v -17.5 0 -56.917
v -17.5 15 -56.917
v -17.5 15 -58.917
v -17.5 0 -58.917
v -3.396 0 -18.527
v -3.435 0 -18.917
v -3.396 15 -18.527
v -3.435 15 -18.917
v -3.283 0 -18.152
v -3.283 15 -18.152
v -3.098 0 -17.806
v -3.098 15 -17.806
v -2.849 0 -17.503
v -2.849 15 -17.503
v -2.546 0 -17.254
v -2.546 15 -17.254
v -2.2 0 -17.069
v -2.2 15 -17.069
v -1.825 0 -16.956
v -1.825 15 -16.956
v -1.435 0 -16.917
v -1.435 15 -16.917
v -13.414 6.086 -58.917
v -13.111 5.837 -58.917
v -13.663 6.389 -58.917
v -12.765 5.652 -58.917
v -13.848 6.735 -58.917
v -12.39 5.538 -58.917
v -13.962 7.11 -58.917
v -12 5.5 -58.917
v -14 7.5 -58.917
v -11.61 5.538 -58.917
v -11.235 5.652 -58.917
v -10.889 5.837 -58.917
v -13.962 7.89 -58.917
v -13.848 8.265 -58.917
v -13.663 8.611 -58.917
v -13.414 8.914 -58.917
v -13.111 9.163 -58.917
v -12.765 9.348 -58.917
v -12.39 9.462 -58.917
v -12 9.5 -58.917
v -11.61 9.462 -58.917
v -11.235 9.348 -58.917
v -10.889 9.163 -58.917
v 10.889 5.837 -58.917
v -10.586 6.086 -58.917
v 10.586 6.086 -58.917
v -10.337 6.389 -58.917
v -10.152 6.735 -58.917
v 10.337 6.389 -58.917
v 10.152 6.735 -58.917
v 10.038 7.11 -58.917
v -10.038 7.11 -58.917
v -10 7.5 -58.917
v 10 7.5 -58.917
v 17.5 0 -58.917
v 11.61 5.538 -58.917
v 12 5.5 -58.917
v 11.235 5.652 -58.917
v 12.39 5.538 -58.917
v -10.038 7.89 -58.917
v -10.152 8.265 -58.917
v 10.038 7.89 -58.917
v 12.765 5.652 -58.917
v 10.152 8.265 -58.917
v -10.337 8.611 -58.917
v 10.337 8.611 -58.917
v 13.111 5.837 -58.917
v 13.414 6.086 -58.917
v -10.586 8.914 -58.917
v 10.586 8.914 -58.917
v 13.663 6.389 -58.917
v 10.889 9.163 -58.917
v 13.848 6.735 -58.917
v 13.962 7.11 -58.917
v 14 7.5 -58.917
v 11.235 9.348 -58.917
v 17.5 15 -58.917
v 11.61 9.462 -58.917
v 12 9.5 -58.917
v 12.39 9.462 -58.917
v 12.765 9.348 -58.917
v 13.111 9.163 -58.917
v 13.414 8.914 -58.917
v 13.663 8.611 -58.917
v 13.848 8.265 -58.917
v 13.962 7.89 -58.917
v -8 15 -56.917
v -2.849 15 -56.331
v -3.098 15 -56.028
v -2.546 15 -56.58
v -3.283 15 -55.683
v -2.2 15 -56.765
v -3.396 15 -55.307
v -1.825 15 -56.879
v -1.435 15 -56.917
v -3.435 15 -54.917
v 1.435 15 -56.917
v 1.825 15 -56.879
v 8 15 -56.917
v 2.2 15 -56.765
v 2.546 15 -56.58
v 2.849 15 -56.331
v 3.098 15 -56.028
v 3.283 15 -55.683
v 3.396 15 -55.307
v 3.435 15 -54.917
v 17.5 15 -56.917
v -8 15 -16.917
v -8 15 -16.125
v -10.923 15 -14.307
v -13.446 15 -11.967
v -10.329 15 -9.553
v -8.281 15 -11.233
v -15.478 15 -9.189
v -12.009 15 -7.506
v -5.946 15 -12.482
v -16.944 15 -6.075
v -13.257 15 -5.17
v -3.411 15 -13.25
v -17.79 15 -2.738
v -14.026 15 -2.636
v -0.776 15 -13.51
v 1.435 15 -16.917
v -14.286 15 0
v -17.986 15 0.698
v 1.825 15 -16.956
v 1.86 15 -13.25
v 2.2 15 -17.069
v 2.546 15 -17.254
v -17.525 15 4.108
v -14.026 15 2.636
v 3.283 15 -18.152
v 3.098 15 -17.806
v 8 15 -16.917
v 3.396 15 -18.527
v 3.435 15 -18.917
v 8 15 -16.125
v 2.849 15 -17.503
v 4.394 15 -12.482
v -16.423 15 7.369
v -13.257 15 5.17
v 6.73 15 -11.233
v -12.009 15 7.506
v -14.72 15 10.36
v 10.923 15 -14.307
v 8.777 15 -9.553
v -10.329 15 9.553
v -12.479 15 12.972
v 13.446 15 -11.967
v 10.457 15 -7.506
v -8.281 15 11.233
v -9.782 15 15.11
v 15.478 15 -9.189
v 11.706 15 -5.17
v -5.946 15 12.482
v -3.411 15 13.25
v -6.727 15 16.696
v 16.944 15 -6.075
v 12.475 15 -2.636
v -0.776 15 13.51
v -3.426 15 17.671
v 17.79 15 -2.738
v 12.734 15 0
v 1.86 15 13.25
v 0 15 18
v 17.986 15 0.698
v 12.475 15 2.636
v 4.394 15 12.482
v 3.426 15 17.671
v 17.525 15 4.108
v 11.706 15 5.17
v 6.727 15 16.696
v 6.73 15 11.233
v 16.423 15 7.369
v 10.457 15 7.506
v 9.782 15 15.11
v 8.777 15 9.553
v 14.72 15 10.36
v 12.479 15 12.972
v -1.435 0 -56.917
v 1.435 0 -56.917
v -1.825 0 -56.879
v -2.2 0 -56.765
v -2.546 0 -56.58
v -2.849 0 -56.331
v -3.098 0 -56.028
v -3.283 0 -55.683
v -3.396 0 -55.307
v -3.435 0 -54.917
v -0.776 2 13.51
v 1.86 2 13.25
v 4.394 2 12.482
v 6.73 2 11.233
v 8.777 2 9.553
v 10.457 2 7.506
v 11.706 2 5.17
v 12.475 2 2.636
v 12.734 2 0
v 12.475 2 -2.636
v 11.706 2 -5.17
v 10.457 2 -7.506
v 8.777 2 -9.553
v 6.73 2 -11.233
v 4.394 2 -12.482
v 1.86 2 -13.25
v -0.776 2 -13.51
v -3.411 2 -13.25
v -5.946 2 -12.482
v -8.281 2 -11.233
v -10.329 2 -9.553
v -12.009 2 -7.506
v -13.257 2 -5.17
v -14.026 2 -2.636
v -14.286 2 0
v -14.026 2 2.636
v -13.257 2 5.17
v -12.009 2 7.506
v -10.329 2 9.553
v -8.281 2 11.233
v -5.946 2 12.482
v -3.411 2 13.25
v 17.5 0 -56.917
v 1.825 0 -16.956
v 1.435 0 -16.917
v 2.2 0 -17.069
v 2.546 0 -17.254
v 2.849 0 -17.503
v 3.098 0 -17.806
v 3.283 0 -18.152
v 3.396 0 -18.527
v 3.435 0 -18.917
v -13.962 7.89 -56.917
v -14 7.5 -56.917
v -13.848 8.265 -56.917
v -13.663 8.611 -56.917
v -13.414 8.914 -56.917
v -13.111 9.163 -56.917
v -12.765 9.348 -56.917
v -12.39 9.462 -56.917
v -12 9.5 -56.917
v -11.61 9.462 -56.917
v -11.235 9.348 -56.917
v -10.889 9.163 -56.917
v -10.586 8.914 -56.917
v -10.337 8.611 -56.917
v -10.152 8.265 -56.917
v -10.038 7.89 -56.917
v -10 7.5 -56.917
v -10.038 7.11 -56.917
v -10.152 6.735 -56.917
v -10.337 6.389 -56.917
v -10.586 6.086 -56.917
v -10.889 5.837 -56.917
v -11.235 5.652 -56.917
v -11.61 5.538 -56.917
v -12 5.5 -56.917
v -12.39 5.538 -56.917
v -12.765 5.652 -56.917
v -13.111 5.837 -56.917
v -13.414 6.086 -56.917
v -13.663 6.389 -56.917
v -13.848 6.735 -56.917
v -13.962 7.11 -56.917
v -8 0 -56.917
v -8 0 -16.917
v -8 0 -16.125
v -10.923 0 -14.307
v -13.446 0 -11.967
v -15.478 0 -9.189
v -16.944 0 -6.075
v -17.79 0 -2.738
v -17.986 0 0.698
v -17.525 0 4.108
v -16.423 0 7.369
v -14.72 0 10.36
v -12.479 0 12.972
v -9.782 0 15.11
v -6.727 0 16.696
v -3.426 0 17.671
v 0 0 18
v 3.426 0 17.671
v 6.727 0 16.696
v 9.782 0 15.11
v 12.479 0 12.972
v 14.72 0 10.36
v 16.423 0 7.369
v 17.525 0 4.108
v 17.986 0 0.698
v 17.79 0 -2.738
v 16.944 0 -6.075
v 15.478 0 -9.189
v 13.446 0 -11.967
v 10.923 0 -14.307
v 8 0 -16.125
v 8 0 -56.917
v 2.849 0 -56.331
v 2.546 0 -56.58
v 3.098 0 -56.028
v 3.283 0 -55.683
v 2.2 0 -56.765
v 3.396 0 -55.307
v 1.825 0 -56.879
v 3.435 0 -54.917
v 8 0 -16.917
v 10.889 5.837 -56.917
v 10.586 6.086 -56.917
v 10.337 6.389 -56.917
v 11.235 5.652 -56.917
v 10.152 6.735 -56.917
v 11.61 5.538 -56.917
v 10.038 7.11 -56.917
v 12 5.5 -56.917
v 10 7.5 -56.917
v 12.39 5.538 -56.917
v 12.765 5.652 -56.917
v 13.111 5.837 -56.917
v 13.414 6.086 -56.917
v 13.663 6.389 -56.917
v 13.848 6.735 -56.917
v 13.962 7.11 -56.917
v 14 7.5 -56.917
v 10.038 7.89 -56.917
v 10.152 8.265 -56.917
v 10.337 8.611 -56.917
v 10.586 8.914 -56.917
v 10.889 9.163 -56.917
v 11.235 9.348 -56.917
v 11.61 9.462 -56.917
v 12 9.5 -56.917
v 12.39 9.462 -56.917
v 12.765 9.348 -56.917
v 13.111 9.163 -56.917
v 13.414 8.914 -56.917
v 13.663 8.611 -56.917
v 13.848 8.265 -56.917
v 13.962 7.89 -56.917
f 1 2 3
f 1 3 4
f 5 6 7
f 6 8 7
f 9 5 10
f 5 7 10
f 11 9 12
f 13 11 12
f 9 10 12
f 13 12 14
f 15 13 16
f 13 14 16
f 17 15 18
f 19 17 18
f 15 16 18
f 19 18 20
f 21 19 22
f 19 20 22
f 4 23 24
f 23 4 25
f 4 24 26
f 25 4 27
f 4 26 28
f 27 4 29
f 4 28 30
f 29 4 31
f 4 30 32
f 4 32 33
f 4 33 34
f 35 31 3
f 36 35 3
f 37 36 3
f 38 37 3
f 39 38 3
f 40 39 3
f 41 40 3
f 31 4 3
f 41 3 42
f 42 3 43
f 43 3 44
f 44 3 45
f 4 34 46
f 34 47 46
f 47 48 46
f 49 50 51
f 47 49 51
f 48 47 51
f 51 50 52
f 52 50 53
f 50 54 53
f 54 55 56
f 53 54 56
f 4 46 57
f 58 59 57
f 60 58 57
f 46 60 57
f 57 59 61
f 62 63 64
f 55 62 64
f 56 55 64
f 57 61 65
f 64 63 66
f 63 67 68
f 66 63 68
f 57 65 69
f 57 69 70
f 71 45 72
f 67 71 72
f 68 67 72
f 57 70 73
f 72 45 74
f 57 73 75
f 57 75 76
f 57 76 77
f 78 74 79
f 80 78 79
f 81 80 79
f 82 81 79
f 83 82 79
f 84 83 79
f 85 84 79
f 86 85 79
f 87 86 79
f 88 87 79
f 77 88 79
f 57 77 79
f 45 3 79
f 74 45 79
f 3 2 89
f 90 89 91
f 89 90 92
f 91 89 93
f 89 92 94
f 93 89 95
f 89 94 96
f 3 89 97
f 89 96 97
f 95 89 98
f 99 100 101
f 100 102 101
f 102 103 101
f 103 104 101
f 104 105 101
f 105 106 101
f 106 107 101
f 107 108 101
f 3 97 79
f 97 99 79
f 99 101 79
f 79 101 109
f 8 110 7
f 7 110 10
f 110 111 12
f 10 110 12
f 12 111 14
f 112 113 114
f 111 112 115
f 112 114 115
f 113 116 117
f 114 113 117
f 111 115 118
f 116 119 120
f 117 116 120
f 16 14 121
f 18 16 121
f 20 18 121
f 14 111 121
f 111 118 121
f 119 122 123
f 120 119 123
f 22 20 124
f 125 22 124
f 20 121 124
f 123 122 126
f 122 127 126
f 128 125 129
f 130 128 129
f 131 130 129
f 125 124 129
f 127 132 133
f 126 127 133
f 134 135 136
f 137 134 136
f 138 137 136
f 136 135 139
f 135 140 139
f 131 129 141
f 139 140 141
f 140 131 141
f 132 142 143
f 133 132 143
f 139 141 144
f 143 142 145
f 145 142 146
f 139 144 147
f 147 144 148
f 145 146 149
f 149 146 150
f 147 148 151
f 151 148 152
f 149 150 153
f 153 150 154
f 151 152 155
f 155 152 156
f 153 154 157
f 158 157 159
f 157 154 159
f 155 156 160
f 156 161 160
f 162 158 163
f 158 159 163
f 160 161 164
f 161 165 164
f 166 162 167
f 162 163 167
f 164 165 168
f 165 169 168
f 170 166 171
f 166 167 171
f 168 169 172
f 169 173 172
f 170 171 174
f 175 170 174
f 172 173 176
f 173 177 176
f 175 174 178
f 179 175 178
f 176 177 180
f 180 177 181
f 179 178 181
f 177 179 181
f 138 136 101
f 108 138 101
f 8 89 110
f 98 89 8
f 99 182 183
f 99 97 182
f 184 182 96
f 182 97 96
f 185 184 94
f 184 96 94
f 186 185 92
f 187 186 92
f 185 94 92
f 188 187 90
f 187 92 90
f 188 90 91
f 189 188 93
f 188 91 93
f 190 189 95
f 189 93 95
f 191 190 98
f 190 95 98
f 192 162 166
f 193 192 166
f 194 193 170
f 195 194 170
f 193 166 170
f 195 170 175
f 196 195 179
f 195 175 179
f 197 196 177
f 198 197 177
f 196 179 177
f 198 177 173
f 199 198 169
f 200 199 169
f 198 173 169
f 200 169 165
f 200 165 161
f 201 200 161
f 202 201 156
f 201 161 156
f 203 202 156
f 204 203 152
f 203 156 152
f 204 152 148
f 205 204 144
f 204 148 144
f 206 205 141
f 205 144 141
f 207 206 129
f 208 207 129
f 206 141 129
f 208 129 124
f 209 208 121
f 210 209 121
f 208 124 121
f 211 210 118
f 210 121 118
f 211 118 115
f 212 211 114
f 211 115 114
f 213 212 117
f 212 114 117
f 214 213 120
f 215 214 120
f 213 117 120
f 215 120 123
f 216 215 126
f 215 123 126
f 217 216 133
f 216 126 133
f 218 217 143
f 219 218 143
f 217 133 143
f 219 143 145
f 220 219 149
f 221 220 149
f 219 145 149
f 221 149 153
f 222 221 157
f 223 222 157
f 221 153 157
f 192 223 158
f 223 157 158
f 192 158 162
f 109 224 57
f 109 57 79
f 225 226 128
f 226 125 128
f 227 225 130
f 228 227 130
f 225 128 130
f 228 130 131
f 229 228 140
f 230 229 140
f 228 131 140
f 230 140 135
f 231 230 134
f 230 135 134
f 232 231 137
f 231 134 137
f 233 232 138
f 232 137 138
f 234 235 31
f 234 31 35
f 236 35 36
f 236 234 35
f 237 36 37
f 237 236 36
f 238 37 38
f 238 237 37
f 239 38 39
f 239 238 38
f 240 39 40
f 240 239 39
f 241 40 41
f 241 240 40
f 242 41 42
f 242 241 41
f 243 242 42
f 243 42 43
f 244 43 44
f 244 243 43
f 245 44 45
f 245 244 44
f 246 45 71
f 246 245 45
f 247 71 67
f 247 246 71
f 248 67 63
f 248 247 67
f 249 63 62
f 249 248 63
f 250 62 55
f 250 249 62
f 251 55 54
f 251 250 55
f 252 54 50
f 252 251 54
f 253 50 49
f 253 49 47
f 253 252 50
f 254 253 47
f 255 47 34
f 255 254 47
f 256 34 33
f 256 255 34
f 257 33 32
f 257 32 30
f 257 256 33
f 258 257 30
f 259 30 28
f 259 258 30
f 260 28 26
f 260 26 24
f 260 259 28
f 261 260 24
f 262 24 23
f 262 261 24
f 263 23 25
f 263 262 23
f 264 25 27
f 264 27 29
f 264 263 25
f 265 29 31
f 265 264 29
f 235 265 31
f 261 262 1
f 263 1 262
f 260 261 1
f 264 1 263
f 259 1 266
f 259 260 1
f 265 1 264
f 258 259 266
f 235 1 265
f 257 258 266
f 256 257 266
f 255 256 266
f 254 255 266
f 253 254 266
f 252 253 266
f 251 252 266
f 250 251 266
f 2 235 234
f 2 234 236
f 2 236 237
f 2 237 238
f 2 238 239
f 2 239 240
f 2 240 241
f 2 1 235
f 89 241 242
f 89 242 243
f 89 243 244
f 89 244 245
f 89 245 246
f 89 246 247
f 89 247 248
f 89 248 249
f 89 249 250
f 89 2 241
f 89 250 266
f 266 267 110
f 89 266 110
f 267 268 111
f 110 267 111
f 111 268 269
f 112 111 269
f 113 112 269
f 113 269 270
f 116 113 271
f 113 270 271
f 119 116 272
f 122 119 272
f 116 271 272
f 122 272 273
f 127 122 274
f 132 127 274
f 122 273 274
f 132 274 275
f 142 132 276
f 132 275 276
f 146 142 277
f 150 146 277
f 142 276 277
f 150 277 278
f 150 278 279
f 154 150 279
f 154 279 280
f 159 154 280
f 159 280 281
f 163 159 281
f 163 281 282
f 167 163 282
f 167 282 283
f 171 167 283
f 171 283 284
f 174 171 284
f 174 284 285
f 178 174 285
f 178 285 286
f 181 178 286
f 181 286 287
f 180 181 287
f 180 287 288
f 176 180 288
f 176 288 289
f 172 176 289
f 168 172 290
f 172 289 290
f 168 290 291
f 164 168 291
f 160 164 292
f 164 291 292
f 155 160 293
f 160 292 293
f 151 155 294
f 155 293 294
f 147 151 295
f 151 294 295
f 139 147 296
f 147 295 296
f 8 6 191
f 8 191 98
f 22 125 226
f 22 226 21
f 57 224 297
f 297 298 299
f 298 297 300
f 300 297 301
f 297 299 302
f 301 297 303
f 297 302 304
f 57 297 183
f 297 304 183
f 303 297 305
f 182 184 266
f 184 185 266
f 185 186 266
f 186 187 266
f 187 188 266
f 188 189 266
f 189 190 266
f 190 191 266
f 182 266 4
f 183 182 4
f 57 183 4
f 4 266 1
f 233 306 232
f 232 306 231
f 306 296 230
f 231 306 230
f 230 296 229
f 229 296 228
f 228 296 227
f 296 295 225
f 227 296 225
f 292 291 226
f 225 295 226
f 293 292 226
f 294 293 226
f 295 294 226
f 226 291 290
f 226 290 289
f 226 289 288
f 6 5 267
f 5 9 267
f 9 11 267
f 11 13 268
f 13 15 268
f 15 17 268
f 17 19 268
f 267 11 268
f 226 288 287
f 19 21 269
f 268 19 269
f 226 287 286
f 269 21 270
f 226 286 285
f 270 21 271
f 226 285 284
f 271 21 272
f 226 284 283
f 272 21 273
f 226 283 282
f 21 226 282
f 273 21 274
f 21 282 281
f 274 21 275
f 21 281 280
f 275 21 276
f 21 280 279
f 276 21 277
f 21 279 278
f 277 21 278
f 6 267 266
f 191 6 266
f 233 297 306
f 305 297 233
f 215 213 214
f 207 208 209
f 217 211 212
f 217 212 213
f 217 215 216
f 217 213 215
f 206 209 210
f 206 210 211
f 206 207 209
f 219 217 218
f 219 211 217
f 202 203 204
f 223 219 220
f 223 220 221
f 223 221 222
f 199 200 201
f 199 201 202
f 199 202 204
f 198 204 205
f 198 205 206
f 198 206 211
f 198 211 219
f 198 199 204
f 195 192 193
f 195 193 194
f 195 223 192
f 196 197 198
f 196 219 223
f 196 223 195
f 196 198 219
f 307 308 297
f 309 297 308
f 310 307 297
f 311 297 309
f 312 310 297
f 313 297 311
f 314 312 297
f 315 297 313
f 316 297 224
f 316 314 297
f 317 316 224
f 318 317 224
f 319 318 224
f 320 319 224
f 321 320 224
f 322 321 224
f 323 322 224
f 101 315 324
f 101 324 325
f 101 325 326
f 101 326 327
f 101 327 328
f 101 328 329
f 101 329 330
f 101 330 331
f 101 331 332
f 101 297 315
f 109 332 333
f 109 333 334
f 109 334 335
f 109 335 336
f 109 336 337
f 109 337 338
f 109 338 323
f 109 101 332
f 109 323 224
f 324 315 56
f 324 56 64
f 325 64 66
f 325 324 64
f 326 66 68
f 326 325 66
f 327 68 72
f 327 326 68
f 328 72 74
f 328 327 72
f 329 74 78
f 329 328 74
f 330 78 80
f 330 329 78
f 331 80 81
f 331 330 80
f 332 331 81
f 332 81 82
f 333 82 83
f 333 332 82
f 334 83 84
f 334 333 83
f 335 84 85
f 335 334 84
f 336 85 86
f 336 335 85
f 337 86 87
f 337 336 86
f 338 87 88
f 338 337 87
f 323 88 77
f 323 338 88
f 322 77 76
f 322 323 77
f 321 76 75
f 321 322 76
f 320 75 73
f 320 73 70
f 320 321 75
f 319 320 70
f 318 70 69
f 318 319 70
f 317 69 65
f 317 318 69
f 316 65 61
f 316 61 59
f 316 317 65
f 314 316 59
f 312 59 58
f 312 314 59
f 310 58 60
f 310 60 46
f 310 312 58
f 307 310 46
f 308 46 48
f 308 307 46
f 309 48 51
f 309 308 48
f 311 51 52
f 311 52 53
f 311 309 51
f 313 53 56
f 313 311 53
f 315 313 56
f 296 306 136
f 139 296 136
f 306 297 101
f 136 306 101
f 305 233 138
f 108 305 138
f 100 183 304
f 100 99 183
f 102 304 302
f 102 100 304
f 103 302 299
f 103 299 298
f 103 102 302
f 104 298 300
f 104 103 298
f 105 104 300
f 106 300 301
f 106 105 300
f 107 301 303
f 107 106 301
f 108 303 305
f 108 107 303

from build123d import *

# Parameters (mm, degrees)
EXTRUDE_1_DEPTH     = 15
SKETCH_3_W          = 16
SKETCH_3_H          = 15
EXTRUDE_2_DEPTH     = 4
SKETCH_2_R          = 13.51
CUT_EXTRUDE_2_DEPTH = 13
SKETCH_4_W          = 4.565228969
SKETCH_4_H          = 15
EXTRUDE_3_DEPTH     = 40
FILLET_2_R          = 2
SKETCH_5_R          = 2
EXTRUDE_4_DEPTH     = 2
FILLET_3_R          = 2


with BuildPart() as part:
    # 草图1 → 凸台-拉伸1 (new body)
    with BuildSketch(Plane(origin=(0, 0, 0), x_dir=(1, 0, 0), z_dir=(0, 1, 0))):
        with BuildLine():
            Line((6.148844254, 16.917201729), (-6.148844254, 16.917201729))
            ThreePointArc((-6.148844254, 16.917201729), (0, -18), (6.148844254, 16.917201729))
        make_face()
    extrude(amount=EXTRUDE_1_DEPTH)

    # 草图3 → 凸台-拉伸2 (add)
    with BuildSketch(Plane(origin=(0, 0, -16.917201729), x_dir=(-1, 0, 0), z_dir=(0, 0, -1))):
        with Locations((0, 7.5)):
            Rectangle(SKETCH_3_W, SKETCH_3_H)
    extrude(amount=-EXTRUDE_2_DEPTH)

    # 草图2 → 切除-拉伸2 (cut)
    with BuildSketch(Plane(origin=(0, 15, 0), x_dir=(1, 0, 0), z_dir=(0, 1, 0))):
        with Locations(Location((-0.775740082, 0, 0), (0, 0, 270))):
            Circle(SKETCH_2_R)
    extrude(amount=-CUT_EXTRUDE_2_DEPTH, mode=Mode.SUBTRACT)

    # 草图4 → 凸台-拉伸3 (add)
    with BuildSketch(Plane(origin=(0, 0, -16.917201729), x_dir=(-1, 0, 0), z_dir=(0, 0, -1))):
        with Locations((5.717385516, 7.5)):
            Rectangle(SKETCH_4_W, SKETCH_4_H)
        with Locations((-5.717385516, 7.5)):
            Rectangle(SKETCH_4_W, SKETCH_4_H)
    extrude(amount=EXTRUDE_3_DEPTH)

    # 圆角2
    fillet_2_edges = [part.edges().sort_by_distance(p)[0] for p in [
        (-3.434771031, 7.5, -16.917201729),
        (3.434771031, 7.5, -16.917201729),
    ]]
    fillet(fillet_2_edges, radius=FILLET_2_R)

    # 草图5 → 凸台-拉伸4 (add)
    with BuildSketch(Plane(origin=(0, 0, -56.917201729), x_dir=(-1, 0, 0), z_dir=(0, 0, -1))):
        Polygon((-17.5, 0), (-17.5, 15), (12.5, 15), (17.5, 15), (17.5, 0), (8, 0), align=None)
        with Locations((-12, 7.5)):
            Circle(SKETCH_5_R, mode=Mode.SUBTRACT)
        with Locations((12, 7.5)):
            Circle(SKETCH_5_R, mode=Mode.SUBTRACT)
    extrude(amount=EXTRUDE_4_DEPTH)

    # 圆角3
    fillet_3_edges = [part.edges().sort_by_distance(p)[0] for p in [
        (-3.434771031, 7.5, -56.917201729),
        (3.434771031, 7.5, -56.917201729),
    ]]
    fillet(fillet_3_edges, radius=FILLET_3_R)


solid = part.part
